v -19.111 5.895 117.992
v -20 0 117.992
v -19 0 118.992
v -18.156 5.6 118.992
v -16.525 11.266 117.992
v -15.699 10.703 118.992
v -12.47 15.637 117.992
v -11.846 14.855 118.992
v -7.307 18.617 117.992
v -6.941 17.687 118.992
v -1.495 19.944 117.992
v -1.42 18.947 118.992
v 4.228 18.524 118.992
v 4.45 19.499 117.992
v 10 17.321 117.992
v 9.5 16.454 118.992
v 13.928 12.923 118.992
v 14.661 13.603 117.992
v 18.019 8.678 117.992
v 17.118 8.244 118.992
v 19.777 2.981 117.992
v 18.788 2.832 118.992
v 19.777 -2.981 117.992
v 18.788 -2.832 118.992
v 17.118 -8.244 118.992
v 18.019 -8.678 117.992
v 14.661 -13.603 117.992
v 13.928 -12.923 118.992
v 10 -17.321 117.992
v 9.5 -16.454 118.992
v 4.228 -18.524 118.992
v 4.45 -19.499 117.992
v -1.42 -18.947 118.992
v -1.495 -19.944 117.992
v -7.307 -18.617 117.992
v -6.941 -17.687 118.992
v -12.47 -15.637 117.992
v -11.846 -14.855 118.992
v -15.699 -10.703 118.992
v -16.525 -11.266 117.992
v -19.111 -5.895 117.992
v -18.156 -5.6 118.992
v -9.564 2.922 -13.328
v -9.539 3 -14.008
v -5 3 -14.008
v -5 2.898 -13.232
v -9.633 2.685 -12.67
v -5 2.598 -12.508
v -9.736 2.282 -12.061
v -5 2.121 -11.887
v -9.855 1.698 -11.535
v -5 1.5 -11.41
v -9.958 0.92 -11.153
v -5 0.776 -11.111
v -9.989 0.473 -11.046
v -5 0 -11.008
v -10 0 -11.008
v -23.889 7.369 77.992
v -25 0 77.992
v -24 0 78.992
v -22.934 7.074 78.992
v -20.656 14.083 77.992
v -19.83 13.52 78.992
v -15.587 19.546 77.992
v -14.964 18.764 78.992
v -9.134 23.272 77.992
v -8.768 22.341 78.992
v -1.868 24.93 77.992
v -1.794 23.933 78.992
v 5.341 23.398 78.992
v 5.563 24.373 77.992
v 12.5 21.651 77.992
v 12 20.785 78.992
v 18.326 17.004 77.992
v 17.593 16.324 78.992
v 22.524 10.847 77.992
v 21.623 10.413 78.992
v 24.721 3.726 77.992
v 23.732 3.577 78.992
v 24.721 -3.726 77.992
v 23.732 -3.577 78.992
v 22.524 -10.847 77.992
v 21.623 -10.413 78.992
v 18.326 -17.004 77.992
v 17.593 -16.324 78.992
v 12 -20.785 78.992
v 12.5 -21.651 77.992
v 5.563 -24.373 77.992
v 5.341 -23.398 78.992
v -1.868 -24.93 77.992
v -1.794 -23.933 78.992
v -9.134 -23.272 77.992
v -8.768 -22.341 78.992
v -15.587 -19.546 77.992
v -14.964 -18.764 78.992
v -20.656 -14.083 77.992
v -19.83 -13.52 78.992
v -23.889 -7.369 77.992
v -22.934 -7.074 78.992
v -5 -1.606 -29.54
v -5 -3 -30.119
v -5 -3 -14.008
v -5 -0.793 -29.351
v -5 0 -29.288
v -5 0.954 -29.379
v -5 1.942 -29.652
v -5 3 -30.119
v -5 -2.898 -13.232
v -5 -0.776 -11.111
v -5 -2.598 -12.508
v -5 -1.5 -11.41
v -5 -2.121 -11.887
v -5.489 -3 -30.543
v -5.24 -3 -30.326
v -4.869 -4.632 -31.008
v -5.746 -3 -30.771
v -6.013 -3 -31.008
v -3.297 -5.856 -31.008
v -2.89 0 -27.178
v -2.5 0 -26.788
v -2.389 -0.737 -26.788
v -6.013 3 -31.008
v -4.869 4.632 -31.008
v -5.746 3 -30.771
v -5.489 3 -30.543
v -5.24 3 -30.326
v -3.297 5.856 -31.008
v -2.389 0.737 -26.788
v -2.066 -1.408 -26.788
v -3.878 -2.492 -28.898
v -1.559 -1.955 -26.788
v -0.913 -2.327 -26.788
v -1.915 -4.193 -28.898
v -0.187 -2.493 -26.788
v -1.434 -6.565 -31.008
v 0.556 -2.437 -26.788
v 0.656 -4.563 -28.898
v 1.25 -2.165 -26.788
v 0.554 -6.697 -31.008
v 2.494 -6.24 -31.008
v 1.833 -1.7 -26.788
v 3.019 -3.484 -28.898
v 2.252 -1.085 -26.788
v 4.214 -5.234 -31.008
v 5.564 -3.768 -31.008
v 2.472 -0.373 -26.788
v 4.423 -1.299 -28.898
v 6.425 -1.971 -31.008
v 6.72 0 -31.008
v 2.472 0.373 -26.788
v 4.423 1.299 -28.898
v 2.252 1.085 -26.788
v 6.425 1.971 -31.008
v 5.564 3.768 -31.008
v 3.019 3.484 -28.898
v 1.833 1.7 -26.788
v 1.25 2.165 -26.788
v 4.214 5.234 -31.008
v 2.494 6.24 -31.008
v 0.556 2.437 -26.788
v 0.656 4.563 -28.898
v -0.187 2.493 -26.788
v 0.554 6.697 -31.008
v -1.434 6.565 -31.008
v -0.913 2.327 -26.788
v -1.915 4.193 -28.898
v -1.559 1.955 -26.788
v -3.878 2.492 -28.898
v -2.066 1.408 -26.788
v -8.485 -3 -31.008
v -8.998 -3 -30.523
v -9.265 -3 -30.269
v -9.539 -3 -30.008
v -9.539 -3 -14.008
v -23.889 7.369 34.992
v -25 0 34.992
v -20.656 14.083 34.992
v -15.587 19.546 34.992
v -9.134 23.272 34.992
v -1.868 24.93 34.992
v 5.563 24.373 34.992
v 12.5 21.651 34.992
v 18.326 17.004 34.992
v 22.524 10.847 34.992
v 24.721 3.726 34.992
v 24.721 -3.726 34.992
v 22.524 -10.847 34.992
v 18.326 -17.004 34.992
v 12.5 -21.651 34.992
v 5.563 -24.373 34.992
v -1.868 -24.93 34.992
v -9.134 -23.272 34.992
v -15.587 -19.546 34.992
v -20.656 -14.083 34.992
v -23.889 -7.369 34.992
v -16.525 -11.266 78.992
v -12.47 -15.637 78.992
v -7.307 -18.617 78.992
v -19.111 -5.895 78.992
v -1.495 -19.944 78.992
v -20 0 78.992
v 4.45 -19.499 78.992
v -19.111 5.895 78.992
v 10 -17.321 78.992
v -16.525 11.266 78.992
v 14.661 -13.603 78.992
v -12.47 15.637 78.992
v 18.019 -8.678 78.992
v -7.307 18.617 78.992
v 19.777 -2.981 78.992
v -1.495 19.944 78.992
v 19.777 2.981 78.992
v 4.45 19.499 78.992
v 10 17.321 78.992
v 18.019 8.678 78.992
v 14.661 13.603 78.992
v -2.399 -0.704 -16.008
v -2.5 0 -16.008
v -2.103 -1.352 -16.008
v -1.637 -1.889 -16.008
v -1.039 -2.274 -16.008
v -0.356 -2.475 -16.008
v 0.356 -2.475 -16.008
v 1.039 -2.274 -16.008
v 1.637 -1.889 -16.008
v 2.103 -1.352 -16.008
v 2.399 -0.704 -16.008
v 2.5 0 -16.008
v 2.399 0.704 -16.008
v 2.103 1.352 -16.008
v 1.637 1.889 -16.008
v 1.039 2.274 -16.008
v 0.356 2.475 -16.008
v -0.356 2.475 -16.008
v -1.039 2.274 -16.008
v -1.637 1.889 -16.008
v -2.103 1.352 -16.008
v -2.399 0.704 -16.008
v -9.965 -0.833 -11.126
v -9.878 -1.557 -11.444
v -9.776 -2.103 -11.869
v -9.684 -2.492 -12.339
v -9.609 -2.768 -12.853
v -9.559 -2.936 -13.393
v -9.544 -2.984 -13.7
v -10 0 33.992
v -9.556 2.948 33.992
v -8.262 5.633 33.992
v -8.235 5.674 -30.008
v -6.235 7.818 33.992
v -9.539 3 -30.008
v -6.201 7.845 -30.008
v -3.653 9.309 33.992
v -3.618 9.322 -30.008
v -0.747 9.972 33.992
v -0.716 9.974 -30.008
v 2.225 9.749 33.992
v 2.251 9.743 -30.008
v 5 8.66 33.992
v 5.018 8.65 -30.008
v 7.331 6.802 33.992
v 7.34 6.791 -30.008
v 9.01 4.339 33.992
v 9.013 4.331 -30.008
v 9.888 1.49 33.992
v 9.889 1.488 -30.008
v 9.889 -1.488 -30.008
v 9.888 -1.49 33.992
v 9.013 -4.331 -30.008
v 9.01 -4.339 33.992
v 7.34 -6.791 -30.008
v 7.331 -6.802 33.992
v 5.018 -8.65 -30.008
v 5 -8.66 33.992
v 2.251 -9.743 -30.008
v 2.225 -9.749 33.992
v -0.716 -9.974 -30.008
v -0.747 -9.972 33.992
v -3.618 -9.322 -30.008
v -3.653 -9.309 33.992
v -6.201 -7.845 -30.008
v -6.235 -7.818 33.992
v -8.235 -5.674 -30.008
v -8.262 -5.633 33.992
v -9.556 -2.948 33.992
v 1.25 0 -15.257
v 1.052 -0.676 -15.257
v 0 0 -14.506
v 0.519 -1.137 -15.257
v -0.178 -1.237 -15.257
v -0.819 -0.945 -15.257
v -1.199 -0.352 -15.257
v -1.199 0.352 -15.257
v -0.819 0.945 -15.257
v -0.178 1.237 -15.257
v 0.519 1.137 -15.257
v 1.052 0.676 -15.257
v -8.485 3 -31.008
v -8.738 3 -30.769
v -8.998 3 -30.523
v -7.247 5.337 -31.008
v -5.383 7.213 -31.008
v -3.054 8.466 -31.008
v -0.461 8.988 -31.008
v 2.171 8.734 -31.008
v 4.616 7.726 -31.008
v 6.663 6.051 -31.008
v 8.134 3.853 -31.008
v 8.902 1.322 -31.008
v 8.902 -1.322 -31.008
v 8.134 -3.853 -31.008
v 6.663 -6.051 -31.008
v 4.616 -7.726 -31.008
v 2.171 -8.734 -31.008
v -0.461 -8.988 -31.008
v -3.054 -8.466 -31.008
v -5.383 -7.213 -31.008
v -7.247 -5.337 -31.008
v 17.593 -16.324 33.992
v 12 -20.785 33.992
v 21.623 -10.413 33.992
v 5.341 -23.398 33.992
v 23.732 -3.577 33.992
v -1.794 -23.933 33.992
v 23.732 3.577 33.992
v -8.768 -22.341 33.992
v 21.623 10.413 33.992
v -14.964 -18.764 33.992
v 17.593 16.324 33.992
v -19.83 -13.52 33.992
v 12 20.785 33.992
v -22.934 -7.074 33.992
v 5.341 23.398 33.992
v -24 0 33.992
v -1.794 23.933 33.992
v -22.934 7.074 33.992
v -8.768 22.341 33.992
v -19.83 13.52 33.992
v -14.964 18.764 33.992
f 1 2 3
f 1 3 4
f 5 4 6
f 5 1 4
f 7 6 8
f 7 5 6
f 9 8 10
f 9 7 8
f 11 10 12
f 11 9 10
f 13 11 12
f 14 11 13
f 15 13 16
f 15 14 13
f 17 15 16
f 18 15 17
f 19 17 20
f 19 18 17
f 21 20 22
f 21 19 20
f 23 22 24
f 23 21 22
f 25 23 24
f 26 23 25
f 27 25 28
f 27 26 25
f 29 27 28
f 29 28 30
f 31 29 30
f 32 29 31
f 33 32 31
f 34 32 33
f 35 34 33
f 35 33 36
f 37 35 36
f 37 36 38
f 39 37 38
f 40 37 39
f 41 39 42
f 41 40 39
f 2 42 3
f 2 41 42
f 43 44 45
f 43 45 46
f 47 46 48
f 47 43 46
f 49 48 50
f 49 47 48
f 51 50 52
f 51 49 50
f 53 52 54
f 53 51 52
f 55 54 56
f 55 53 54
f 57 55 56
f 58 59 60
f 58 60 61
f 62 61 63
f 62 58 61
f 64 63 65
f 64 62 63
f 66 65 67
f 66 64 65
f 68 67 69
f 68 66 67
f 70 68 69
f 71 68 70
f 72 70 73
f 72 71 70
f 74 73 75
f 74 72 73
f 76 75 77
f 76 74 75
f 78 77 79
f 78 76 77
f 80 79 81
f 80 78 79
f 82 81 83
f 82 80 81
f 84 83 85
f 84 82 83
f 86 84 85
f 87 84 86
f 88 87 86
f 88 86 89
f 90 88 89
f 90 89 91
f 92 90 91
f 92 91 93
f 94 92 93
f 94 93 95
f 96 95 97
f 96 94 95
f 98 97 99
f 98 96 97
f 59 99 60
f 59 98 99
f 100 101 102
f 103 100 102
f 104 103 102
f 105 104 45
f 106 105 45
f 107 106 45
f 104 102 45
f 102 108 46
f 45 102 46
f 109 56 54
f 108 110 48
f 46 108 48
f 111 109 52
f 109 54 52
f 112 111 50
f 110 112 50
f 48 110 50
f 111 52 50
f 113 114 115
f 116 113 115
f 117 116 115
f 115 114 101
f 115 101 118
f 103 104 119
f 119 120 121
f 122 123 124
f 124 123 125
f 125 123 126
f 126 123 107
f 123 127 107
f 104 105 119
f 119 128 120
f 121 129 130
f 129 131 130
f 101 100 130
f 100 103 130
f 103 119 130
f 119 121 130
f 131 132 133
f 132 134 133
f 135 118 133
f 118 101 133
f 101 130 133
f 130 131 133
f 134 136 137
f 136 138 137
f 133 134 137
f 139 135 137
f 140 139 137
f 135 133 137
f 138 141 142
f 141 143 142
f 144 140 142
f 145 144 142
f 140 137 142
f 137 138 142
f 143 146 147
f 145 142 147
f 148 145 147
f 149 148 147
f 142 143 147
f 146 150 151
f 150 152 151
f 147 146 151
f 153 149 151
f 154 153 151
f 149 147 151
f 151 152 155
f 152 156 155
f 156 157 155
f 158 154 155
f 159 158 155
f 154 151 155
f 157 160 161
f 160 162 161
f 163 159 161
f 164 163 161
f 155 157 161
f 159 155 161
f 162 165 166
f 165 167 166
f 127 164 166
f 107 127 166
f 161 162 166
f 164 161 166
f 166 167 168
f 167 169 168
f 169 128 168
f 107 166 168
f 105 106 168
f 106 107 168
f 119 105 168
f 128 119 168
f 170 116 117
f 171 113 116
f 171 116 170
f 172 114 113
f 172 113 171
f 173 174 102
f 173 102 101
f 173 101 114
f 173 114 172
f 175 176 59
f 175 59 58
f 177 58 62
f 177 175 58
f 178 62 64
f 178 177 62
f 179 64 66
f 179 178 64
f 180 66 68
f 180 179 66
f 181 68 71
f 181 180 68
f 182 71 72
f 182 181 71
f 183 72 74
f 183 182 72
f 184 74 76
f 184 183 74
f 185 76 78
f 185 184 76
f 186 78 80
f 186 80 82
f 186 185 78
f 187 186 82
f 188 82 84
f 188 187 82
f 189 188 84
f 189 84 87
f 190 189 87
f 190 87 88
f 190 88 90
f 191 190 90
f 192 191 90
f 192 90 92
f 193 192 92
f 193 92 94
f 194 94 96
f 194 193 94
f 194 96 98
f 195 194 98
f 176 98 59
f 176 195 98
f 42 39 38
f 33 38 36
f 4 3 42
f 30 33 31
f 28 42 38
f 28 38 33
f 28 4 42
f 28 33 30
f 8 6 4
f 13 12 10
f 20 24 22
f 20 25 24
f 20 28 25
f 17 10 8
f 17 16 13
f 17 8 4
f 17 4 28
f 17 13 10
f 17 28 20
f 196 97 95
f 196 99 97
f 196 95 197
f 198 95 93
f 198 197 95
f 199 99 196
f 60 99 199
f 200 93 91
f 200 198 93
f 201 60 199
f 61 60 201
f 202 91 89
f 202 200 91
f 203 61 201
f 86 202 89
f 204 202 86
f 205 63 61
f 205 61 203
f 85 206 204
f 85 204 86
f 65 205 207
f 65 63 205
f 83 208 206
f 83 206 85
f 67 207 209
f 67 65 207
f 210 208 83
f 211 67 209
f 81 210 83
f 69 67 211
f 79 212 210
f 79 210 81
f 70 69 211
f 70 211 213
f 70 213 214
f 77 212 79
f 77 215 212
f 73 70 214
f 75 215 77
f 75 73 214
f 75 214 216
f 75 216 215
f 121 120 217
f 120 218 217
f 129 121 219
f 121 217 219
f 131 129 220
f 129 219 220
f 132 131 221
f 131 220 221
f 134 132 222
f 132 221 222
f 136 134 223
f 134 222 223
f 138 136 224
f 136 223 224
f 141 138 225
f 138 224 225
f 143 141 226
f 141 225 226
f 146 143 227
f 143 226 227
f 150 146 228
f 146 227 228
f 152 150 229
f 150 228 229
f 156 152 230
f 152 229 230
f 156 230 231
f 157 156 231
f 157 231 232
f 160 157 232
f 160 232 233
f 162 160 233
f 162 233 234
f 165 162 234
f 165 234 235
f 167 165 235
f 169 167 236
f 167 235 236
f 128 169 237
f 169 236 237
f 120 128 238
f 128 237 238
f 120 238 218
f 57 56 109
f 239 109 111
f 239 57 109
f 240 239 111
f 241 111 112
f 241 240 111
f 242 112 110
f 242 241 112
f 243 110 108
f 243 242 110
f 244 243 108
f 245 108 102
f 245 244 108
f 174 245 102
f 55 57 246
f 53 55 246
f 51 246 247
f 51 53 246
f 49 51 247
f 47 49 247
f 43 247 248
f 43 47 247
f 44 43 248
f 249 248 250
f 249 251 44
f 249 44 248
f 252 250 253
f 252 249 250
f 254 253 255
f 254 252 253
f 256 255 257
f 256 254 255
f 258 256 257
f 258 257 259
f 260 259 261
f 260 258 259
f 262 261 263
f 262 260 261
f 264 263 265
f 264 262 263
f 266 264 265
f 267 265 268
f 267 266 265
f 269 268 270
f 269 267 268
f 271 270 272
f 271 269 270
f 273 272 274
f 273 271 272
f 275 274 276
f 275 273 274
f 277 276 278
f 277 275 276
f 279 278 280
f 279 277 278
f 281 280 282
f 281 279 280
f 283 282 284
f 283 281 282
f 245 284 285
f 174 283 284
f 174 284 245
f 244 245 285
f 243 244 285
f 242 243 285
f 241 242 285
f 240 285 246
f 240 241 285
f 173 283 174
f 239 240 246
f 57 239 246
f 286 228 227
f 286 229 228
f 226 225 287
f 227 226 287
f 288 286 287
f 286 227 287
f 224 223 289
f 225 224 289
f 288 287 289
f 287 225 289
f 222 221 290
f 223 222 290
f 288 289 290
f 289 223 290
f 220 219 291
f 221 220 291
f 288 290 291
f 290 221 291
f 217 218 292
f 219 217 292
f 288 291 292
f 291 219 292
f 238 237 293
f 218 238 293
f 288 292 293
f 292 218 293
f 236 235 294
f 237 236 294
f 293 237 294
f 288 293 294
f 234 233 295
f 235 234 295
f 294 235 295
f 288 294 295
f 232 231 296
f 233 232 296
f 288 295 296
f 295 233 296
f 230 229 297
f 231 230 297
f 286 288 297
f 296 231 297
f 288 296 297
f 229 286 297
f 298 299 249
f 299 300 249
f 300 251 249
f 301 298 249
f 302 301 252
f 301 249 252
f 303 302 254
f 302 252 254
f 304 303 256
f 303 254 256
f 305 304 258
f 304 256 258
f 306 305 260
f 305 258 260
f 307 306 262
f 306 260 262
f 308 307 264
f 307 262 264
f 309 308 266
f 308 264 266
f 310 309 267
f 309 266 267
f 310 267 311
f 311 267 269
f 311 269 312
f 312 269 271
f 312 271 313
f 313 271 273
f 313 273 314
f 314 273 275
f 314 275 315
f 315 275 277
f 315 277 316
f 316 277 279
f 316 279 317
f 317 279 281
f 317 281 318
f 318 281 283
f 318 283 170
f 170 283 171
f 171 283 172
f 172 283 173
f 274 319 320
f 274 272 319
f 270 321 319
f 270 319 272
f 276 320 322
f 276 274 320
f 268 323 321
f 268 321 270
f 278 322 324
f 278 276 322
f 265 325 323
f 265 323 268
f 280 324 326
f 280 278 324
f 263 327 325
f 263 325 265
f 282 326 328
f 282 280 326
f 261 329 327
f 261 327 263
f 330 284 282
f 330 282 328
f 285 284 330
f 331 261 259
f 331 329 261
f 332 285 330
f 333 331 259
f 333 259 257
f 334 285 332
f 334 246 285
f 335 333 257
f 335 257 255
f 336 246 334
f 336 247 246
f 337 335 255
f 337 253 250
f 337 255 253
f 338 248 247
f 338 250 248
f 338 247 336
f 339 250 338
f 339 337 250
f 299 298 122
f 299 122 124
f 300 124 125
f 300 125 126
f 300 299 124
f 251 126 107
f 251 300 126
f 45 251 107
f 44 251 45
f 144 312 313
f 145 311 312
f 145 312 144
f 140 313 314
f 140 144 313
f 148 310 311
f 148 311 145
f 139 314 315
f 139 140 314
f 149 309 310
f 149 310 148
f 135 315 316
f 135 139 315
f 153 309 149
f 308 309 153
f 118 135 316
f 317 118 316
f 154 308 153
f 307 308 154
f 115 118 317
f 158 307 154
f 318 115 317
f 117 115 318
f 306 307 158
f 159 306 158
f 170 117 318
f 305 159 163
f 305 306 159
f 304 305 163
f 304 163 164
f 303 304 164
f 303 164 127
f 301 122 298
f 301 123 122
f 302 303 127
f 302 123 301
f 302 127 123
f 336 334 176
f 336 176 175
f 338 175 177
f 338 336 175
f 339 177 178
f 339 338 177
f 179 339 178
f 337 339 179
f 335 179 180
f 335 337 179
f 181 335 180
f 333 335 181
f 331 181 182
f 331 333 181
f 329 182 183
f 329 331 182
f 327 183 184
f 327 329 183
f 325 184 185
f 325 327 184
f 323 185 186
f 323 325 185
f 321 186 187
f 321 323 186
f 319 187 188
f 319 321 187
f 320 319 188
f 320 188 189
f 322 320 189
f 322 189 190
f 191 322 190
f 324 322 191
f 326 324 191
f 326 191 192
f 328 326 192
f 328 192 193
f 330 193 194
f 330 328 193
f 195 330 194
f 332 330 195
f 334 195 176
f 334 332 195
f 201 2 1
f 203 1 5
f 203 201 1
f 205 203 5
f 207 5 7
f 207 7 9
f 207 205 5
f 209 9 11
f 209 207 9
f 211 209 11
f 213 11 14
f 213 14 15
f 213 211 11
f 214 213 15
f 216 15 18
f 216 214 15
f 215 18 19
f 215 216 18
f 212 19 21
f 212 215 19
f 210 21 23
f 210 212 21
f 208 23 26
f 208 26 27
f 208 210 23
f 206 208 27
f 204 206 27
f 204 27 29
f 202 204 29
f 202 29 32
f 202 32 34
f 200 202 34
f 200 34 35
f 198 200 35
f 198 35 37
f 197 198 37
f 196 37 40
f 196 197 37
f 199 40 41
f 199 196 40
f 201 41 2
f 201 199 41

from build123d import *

# Parameters (mm, degrees)
F2_SIZE        = 1
F5_DEPTH       = 5
F8_D           = 5
F8_DEPTH       = 15
F8_CSINK_D     = 13.44
F8_CSINK_ANGLE = 90
F8_TIP         = 1.5021515476


with BuildPart() as f1:
    # F0 (on Front) → F1 (revolve)
    with BuildSketch(Plane.XZ):
        Polygon((-10, -31.0083918493), (0, -31.0083918493), (0, 118.9916081507), (-20, 118.9916081507), (-20, 78.9916081507), (-25, 78.9916081507), (-25, 33.9916081507), (-10, 33.9916081507), align=None)
    revolve(axis=Axis((0, 0, 43.9916081507), (0, 0, -1)))

    # F2
    f2_edges = [f1.edges().sort_by_distance(p)[0] for p in [
        (10, 0, -31.008392),
        (25, 0, 33.991608),
        (25, 0, 78.991608),
        (20, 0, 118.991608),
    ]]
    chamfer(f2_edges, length=F2_SIZE)

    # F4 (on offset) → F5 (cut)
    with BuildSketch(Plane.YZ.offset(-10)):
        with BuildLine():
            Line((-3, -31.0083918493), (3, -31.0083918493))
            Line((3, -31.0083918493), (3, -14.0083918493))
            ThreePointArc((3, -14.0083918493), (2.1213203436, -11.8870715058), (0, -11.0083918493))
            ThreePointArc((0, -11.0083918493), (-2.1213203436, -11.8870715058), (-3, -14.0083918493))
            Line((-3, -14.0083918493), (-3, -31.0083918493))
        make_face()
    extrude(amount=F5_DEPTH, mode=Mode.SUBTRACT)

    # F8
    with Locations(Plane(origin=(0, 0, -31.0083918493), x_dir=(1, 0, 0), z_dir=(0, 0, -1))):
        with Locations((0, 0)):
            CounterSinkHole(F8_D / 2, F8_CSINK_D / 2, depth=F8_DEPTH, counter_sink_angle=F8_CSINK_ANGLE)
            with Locations((0, 0, -(F8_DEPTH + F8_TIP / 2))):  # 118° drill point
                Cone(0, F8_D / 2, F8_TIP, mode=Mode.SUBTRACT)


solid = f1.part
